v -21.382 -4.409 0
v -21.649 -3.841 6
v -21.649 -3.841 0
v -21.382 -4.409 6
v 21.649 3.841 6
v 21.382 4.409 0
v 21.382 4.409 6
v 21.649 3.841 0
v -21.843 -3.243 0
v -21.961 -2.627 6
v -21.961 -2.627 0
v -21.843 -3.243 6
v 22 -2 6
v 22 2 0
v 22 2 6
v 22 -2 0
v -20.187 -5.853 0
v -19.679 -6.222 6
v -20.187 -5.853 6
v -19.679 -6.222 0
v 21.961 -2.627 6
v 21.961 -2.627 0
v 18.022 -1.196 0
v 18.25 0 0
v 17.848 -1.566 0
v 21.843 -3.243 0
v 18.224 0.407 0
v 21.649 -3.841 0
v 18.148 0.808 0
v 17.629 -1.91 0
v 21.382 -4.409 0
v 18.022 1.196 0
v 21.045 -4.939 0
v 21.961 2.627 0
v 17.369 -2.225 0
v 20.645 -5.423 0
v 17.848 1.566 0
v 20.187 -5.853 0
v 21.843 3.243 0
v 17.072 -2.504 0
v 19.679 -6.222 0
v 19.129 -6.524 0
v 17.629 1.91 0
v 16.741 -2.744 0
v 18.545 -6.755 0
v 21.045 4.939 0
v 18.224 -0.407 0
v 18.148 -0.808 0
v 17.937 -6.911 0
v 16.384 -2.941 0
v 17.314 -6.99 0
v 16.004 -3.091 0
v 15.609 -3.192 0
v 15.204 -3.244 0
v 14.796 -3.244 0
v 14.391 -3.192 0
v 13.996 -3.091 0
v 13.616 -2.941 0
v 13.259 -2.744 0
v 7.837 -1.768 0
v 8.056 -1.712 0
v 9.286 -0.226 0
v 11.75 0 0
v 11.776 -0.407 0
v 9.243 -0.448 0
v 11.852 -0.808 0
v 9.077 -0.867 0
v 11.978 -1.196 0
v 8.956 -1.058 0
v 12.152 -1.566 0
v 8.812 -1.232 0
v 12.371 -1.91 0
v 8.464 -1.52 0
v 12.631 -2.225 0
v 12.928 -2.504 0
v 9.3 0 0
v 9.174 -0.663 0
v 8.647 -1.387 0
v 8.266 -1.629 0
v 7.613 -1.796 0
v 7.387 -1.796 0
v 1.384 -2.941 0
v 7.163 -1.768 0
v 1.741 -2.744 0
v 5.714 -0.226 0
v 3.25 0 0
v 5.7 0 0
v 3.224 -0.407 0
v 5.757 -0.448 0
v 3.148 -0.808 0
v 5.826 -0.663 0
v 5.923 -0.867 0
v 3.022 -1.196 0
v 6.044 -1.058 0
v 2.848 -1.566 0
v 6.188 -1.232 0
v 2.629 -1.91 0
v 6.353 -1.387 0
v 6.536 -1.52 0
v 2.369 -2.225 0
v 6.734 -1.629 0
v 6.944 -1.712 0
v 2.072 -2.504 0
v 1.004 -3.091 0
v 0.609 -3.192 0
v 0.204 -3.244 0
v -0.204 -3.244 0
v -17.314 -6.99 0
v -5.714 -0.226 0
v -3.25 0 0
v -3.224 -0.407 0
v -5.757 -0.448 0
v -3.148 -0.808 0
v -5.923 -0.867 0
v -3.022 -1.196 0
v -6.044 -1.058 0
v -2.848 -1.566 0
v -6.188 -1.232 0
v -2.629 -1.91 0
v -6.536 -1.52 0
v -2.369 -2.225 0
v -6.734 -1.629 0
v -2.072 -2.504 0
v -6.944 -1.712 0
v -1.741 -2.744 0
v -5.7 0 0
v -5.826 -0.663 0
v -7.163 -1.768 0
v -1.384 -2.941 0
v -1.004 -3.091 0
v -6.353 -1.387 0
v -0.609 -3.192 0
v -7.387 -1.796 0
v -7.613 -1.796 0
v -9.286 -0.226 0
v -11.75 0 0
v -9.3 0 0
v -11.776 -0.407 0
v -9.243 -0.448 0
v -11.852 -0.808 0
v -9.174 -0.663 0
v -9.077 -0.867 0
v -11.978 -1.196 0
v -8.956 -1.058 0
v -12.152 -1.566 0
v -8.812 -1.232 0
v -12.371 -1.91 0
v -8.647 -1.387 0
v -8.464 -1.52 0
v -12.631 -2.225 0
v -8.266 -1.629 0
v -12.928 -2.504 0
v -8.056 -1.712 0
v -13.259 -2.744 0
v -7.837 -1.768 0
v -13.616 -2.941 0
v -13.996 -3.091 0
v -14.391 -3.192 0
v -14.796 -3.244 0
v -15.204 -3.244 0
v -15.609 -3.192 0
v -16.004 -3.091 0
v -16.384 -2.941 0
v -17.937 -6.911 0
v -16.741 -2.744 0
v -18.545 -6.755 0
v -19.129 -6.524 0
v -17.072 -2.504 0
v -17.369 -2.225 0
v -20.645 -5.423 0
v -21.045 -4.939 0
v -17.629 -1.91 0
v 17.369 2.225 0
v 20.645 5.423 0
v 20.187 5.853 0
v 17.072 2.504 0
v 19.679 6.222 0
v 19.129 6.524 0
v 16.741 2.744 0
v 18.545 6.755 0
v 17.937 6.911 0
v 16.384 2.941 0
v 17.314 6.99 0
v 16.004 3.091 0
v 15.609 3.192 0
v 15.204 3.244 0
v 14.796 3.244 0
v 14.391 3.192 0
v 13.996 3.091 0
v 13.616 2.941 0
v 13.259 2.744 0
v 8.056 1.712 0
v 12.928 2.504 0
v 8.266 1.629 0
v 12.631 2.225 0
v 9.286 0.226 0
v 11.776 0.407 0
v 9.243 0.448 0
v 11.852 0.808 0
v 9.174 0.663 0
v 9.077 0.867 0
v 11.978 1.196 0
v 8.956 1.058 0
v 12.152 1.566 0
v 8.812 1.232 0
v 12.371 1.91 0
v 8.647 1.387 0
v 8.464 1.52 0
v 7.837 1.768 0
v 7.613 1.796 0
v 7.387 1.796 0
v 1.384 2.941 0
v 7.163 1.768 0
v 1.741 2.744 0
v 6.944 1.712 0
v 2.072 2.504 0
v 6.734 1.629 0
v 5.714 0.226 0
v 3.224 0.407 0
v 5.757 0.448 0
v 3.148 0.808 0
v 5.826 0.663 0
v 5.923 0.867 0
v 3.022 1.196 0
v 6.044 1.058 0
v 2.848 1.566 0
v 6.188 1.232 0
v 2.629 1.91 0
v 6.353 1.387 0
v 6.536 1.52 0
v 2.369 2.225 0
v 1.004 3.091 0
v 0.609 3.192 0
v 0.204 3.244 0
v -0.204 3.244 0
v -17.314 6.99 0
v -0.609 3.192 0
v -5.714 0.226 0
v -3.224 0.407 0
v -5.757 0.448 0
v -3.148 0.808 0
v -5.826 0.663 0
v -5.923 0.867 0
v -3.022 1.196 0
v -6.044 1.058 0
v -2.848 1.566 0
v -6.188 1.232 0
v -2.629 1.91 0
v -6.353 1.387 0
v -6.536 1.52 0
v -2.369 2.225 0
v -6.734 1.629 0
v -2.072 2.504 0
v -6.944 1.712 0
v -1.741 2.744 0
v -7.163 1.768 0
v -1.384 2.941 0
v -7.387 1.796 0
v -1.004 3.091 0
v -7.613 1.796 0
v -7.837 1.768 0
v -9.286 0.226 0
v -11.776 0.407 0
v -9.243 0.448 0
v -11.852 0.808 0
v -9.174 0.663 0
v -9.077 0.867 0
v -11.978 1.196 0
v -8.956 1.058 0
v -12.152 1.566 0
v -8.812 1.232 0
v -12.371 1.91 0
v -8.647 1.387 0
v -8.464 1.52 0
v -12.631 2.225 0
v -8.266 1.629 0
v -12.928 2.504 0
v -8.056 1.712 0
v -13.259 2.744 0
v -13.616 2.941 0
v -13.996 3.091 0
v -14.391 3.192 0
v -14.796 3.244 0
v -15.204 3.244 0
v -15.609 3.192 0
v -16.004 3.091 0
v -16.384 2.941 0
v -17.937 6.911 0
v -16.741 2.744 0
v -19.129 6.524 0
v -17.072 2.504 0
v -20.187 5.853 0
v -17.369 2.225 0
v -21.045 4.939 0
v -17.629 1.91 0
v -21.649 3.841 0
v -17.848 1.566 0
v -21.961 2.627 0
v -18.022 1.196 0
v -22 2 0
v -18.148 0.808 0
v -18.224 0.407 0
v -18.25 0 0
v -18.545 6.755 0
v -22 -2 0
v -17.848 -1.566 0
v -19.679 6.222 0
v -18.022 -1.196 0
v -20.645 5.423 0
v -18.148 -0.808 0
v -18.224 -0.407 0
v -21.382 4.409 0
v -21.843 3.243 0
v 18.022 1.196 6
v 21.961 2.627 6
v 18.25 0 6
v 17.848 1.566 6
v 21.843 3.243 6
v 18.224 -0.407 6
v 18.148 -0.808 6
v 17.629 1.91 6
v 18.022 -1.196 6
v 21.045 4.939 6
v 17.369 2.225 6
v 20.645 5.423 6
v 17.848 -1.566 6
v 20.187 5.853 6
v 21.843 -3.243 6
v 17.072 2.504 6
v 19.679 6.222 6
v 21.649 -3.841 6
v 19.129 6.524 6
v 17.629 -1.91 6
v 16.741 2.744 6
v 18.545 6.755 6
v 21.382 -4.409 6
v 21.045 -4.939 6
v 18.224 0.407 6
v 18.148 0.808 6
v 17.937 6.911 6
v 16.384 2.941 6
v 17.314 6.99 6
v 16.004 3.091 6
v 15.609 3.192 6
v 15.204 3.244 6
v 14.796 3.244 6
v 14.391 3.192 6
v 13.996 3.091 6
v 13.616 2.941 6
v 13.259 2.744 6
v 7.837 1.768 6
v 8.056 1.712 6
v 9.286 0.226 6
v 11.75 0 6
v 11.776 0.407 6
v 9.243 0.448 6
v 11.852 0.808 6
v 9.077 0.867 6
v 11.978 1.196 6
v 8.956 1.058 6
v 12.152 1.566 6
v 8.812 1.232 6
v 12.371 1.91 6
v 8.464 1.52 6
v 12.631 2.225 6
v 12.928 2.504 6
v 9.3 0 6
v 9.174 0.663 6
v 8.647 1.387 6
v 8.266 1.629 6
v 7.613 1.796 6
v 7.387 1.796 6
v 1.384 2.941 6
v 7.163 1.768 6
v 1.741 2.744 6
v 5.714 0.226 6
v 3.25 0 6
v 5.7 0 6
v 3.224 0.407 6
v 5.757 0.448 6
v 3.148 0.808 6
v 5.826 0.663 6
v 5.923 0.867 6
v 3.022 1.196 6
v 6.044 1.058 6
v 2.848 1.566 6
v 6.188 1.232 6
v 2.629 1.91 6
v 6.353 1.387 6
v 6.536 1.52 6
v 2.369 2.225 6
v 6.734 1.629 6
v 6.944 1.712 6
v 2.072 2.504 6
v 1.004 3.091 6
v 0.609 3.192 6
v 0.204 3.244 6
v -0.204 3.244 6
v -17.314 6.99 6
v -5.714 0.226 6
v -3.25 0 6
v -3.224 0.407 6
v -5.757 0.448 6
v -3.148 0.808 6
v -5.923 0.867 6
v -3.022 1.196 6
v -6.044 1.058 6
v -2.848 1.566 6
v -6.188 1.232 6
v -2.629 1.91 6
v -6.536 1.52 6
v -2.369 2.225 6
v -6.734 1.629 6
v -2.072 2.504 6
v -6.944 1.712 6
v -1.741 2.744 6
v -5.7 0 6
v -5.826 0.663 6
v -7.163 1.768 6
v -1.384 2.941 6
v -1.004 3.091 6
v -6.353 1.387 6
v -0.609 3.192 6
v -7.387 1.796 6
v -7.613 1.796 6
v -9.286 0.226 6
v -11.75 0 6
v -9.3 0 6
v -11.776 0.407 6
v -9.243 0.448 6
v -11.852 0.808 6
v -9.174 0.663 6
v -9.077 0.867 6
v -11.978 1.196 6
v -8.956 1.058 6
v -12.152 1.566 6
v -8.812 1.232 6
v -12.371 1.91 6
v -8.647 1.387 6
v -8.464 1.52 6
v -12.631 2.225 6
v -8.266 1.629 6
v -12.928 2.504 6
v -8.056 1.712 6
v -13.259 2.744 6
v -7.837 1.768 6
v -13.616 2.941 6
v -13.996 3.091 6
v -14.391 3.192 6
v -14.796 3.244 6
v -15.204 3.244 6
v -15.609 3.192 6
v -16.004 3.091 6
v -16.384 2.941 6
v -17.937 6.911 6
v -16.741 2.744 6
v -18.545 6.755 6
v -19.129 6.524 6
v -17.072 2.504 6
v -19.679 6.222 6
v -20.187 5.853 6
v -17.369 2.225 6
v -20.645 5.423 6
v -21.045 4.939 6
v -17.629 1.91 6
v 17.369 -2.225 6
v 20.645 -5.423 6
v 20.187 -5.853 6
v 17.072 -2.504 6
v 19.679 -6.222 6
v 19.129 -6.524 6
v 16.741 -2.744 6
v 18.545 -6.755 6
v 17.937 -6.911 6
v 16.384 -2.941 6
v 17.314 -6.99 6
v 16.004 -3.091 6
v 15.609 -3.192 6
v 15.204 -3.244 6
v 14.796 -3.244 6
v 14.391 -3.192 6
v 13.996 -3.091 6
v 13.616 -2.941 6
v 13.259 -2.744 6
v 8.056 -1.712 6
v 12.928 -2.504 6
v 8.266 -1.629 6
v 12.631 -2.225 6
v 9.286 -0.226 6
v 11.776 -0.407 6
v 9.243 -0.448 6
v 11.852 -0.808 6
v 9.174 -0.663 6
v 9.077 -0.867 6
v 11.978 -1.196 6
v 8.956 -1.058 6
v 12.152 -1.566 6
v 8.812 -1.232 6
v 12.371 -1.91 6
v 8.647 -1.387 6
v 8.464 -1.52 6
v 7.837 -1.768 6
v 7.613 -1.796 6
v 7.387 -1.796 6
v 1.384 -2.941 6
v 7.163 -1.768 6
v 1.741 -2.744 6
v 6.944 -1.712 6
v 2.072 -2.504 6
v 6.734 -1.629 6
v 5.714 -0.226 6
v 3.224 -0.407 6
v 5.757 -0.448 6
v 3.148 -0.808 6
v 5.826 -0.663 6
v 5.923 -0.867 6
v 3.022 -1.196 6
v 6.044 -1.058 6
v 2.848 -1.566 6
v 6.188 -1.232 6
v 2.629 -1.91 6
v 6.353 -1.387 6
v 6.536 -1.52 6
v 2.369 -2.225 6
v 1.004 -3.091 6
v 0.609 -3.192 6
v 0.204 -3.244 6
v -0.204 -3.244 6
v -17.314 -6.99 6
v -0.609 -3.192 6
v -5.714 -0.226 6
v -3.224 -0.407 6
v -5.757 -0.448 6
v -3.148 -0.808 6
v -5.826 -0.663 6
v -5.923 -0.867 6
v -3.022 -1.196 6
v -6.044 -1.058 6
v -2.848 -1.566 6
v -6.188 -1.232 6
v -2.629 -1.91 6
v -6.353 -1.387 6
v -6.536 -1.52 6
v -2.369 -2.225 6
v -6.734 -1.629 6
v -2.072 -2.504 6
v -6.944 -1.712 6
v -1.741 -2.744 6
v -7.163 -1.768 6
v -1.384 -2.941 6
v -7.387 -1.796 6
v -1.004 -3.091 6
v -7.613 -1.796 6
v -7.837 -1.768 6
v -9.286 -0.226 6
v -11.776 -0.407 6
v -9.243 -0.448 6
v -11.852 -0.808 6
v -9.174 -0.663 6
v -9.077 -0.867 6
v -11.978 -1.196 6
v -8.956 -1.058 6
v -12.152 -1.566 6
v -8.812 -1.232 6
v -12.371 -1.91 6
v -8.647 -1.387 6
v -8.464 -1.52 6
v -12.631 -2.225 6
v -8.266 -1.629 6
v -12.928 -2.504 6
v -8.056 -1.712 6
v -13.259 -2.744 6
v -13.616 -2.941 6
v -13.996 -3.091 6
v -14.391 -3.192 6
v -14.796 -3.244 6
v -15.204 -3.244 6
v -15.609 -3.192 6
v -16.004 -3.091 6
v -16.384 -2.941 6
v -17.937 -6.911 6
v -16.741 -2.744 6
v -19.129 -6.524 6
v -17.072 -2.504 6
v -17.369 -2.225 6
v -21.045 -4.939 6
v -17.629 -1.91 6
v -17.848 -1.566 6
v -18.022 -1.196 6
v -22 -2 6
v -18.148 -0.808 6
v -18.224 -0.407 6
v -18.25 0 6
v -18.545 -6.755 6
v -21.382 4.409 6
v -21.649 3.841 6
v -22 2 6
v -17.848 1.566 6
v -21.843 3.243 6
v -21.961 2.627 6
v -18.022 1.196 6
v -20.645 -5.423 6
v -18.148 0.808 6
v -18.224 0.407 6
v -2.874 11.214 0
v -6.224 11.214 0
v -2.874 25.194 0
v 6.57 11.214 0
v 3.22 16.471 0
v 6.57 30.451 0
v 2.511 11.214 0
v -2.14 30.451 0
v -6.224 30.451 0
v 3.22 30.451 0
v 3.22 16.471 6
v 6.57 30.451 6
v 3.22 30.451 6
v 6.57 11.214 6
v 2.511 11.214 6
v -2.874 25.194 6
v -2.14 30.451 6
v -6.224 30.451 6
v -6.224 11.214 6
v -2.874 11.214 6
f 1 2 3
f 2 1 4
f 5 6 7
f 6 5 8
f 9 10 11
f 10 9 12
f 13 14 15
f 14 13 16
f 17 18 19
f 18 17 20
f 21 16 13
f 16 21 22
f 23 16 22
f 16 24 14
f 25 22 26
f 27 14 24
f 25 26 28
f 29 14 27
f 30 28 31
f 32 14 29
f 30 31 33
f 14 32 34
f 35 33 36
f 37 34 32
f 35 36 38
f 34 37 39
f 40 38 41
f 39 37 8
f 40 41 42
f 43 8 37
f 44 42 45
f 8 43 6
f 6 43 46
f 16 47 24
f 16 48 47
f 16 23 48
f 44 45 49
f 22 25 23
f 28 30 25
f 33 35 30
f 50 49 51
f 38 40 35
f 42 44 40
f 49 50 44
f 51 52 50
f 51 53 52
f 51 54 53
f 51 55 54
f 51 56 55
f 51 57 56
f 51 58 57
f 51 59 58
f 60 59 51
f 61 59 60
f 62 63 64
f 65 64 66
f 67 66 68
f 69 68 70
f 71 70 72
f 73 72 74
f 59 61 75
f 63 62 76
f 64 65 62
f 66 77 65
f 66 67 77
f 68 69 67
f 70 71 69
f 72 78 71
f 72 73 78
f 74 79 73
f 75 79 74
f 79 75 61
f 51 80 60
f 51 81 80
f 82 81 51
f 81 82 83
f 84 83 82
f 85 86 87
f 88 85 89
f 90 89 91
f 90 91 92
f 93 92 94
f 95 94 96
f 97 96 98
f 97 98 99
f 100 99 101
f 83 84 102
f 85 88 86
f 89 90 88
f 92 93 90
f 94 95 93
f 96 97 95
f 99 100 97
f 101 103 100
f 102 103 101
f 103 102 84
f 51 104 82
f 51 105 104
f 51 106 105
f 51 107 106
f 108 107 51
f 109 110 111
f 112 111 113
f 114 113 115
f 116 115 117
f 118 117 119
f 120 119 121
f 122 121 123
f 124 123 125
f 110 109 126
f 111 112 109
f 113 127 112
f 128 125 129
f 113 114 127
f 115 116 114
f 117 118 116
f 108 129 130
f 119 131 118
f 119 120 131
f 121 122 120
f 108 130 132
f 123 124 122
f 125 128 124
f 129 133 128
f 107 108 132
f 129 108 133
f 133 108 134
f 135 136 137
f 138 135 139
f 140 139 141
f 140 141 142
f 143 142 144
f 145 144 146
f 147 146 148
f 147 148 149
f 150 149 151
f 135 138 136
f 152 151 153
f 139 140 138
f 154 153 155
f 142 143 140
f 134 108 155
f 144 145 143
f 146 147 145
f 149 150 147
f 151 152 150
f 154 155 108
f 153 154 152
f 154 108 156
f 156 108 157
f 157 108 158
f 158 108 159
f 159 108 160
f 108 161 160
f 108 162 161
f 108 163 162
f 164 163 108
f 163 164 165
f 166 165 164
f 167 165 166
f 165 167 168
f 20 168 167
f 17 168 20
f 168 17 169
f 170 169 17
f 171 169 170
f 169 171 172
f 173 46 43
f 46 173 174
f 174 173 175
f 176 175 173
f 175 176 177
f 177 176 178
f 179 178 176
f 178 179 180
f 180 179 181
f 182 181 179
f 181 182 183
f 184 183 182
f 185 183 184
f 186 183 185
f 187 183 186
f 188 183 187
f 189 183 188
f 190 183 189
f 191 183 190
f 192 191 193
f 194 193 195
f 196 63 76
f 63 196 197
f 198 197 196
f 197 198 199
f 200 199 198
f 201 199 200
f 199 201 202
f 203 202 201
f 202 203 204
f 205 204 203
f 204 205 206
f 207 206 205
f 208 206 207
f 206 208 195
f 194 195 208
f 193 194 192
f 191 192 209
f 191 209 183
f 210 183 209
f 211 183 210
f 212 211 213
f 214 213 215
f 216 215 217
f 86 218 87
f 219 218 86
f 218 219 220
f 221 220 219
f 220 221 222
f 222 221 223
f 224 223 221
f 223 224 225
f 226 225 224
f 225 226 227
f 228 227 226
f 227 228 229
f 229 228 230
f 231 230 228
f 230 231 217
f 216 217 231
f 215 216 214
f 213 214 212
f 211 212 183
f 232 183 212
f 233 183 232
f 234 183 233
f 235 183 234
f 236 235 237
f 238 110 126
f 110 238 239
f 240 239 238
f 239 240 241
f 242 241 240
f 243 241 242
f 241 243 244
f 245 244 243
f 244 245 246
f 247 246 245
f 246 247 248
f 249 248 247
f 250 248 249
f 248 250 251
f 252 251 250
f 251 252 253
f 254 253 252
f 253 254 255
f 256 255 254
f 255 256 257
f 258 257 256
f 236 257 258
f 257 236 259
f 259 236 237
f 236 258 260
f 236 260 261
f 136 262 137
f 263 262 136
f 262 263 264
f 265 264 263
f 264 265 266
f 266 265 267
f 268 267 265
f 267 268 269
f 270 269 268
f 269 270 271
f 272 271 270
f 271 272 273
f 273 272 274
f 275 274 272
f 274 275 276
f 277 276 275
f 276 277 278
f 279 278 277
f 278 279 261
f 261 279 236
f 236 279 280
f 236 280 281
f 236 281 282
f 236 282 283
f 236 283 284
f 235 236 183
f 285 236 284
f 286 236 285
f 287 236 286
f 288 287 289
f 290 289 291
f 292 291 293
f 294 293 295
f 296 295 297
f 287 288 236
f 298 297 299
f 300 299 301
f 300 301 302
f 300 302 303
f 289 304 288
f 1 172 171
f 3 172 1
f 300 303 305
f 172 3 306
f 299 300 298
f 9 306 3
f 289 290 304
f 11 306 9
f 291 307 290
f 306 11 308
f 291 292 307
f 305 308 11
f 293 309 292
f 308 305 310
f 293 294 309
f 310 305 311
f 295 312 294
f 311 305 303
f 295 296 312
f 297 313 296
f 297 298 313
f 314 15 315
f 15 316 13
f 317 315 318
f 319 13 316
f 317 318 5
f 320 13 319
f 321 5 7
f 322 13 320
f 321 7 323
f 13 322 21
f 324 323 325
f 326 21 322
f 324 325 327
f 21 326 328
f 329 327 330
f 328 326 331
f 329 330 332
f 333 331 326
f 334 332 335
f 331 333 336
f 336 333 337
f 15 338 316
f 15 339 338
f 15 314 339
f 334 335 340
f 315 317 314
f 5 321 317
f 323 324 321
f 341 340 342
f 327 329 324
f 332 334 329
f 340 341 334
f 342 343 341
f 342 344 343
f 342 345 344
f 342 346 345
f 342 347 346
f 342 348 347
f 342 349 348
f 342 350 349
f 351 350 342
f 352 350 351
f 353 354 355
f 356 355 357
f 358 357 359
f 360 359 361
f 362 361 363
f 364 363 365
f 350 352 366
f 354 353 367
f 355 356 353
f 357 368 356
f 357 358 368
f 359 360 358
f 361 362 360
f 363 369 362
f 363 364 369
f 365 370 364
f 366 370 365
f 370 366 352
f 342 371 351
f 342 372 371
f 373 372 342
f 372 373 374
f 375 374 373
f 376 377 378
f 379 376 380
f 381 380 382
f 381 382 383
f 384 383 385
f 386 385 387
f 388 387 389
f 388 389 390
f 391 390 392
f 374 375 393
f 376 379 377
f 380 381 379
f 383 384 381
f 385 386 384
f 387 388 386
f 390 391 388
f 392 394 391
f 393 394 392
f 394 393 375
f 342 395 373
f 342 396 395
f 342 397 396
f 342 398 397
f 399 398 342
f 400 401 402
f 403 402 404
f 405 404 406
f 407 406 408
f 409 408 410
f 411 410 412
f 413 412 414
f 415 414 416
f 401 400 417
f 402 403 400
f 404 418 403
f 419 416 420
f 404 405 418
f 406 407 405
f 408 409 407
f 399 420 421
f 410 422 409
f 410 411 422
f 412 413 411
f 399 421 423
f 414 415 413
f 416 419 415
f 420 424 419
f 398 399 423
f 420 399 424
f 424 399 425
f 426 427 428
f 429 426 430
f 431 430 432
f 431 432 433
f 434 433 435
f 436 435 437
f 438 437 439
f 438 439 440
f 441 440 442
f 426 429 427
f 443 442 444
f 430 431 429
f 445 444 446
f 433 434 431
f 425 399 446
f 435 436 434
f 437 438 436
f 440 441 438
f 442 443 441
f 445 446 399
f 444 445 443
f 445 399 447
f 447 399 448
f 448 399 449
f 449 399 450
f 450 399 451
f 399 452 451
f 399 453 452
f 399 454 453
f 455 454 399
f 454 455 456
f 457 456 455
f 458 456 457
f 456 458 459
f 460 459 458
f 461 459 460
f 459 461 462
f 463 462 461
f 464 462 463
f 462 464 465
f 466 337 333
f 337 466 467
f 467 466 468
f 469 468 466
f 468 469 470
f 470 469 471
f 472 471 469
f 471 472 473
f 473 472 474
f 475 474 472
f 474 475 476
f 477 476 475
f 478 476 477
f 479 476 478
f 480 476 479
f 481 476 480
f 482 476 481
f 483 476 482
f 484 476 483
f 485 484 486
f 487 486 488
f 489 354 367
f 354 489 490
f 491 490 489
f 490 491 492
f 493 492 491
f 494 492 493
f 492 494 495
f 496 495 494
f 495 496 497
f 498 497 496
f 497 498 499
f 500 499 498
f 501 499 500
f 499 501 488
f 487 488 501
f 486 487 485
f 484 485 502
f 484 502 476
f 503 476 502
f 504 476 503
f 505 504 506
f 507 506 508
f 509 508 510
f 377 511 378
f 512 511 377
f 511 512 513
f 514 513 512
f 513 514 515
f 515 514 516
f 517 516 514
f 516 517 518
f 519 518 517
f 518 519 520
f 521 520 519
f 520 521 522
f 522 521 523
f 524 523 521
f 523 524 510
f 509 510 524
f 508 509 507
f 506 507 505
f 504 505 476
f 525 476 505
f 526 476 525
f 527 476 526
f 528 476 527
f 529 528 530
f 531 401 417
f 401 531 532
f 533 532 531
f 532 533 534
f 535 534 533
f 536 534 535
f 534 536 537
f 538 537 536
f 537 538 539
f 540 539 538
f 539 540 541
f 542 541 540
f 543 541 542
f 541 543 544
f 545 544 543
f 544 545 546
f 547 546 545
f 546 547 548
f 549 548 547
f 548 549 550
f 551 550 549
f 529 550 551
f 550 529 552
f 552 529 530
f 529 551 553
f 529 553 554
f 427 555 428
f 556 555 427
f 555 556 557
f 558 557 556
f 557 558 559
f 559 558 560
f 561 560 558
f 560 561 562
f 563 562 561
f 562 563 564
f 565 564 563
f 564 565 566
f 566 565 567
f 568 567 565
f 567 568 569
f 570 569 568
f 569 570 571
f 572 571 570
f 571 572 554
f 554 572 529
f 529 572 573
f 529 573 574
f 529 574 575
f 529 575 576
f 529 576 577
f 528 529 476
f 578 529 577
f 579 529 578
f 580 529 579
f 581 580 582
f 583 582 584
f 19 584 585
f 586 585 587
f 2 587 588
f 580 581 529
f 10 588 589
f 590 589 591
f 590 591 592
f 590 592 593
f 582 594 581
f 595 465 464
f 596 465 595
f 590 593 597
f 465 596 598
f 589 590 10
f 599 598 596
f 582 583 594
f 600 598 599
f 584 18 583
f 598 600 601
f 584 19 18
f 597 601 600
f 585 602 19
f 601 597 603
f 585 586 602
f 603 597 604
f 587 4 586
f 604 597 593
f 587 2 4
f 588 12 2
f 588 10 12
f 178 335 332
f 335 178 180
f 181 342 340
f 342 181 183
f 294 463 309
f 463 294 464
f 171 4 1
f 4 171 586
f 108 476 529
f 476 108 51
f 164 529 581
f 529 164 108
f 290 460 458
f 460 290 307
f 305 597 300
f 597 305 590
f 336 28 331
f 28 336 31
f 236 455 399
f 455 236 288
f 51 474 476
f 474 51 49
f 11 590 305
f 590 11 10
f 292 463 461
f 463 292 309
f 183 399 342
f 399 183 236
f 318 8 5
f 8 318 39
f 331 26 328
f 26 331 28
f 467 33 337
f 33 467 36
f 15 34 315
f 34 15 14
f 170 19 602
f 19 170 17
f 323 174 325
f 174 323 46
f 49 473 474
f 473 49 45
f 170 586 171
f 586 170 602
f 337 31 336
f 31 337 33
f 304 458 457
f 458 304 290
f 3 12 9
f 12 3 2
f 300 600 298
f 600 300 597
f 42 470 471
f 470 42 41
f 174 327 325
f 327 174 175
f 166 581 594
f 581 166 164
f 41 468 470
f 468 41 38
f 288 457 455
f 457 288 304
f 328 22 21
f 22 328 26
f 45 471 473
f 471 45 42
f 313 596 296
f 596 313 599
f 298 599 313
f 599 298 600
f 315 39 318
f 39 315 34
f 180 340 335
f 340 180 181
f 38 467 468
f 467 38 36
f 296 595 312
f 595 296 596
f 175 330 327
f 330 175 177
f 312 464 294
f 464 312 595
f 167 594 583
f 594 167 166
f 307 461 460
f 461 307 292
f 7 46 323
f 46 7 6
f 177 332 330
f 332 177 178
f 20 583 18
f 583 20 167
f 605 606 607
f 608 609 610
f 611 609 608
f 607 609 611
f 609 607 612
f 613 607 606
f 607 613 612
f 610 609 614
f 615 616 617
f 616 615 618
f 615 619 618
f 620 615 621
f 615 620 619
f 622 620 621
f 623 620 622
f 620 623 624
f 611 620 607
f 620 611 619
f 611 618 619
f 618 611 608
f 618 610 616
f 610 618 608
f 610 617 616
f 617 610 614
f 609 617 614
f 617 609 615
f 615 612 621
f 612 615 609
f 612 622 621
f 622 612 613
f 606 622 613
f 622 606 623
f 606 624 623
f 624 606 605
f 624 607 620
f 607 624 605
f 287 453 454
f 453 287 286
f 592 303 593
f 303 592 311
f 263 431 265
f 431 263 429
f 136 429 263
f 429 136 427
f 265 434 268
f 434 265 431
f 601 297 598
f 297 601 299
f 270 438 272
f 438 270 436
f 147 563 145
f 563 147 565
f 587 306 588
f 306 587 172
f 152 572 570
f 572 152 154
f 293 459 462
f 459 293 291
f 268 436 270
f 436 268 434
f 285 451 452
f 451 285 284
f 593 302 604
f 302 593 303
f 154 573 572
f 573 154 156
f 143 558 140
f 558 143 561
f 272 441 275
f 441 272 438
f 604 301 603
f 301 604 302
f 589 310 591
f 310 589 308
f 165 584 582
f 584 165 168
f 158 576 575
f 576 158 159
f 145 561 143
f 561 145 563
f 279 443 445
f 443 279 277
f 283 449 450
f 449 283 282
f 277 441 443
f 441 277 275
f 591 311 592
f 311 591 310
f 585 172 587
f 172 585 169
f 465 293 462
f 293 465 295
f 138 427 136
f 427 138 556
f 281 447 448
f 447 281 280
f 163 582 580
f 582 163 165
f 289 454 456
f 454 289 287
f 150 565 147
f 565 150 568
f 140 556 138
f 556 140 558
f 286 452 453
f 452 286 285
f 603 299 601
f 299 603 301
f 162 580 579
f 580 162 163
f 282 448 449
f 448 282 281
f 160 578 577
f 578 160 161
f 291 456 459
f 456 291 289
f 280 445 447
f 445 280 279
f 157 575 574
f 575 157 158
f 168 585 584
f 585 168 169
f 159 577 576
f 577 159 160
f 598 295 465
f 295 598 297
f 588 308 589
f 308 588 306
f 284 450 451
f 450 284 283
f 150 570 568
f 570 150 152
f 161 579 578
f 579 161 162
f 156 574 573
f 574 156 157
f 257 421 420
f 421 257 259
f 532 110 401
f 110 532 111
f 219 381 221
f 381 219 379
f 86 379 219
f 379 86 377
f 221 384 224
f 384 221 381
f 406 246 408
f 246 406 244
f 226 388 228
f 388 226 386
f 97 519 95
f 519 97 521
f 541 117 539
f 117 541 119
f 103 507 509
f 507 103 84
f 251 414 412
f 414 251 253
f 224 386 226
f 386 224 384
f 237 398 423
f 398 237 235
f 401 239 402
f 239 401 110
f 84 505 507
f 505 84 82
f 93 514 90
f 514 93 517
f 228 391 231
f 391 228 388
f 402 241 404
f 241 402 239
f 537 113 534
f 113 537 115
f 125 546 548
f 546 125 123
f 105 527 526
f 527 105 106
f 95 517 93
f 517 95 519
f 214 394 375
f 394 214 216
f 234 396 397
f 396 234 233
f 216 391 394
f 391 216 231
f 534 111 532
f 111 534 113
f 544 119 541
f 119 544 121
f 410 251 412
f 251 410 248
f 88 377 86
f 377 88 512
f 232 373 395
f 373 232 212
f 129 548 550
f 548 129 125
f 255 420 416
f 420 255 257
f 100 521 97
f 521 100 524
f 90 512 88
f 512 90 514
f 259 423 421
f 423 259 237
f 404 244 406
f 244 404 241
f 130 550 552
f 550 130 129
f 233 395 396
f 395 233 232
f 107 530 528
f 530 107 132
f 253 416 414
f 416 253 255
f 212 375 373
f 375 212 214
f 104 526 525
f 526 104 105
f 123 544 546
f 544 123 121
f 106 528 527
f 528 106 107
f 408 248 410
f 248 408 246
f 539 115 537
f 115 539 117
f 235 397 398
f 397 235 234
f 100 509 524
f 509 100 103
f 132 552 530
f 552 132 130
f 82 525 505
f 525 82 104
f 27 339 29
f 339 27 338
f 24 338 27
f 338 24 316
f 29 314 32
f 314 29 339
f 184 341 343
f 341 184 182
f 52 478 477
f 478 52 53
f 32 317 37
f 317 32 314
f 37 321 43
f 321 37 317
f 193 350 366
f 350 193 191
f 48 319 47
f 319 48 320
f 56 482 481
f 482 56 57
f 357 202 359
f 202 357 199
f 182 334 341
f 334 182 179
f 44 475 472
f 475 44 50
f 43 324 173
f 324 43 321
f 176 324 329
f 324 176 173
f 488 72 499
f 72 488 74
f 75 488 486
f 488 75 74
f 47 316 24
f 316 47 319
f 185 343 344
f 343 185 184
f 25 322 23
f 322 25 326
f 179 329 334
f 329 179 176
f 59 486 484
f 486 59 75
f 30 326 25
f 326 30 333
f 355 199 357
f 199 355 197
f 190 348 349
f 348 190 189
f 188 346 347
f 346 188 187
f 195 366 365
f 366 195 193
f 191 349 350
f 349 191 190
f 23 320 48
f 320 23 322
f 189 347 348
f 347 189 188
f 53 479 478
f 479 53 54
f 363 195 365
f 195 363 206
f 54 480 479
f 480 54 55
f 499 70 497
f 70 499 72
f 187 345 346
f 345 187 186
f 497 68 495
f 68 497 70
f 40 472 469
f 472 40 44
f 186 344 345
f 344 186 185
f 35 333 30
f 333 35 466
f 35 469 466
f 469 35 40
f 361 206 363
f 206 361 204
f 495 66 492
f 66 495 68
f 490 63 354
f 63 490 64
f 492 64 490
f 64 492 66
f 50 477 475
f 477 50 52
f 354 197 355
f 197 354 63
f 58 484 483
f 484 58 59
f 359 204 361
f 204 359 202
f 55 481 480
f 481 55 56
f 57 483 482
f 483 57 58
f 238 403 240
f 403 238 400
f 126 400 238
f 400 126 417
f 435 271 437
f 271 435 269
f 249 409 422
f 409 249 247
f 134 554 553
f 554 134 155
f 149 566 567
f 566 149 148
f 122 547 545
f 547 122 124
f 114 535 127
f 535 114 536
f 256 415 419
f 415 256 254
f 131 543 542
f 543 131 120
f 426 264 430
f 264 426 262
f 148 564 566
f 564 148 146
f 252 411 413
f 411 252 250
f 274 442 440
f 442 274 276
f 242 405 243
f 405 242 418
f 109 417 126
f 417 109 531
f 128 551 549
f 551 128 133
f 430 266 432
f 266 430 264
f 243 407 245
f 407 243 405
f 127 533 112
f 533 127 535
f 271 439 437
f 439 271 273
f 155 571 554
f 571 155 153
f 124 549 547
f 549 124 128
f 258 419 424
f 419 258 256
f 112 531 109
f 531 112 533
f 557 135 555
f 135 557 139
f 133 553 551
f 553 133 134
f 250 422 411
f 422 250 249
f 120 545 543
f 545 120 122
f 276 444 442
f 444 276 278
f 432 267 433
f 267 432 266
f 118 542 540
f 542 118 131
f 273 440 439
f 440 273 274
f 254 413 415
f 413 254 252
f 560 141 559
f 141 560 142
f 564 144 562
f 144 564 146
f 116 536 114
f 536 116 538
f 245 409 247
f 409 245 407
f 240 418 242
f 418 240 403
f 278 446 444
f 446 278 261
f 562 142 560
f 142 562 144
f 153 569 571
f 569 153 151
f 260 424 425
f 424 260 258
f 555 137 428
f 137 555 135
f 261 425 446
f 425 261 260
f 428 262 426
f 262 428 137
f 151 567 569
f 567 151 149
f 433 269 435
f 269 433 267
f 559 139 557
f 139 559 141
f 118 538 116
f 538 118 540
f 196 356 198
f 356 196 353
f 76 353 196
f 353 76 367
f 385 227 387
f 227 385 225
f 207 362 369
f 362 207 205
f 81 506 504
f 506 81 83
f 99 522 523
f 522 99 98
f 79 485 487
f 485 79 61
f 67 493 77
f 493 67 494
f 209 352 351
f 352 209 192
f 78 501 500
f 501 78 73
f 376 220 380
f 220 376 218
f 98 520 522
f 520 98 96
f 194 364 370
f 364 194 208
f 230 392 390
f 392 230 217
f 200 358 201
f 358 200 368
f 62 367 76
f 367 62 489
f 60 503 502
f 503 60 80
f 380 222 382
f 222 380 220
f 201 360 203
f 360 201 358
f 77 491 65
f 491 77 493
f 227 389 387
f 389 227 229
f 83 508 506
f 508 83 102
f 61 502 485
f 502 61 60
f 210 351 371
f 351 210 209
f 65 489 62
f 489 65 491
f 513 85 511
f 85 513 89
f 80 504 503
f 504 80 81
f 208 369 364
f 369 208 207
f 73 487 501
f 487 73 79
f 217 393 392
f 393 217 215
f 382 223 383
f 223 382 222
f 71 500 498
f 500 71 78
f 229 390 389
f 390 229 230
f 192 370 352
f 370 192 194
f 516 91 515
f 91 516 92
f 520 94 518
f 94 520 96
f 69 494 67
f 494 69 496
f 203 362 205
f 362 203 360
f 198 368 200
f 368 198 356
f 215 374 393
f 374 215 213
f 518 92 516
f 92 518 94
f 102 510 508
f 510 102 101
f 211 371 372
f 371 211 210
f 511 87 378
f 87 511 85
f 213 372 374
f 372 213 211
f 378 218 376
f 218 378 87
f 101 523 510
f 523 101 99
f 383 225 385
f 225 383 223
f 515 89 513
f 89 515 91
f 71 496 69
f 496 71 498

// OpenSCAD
$fn = 50;


difference() {
	union() {
		hull() {
			translate(v = [-17.0000000000, 2.0000000000, 0]) {
				cylinder(h = 6, r = 5);
			}
			translate(v = [17.0000000000, 2.0000000000, 0]) {
				cylinder(h = 6, r = 5);
			}
			translate(v = [-17.0000000000, -2.0000000000, 0]) {
				cylinder(h = 6, r = 5);
			}
			translate(v = [17.0000000000, -2.0000000000, 0]) {
				cylinder(h = 6, r = 5);
			}
		}
		translate(v = [0, 30.0000000000, 0]) {
			linear_extrude(height = 6) {
				text(font = "DejaVu Sans Mono:style=Bold", halign = "center", size = 19.0000000000, text = "N", valign = "top");
			}
		}
	}
	union() {
		translate(v = [-15.0000000000, 0.0000000000, 0]) {
			translate(v = [0, 0, -100]) {
				cylinder(h = 200, r = 3.2500000000);
			}
		}
		translate(v = [0, 0, -100]) {
			cylinder(h = 200, r = 3.2500000000);
		}
		translate(v = [15.0000000000, 0.0000000000, 0]) {
			translate(v = [0, 0, -100]) {
				cylinder(h = 200, r = 3.2500000000);
			}
		}
		translate(v = [-15.0000000000, 0.0000000000, 0]) {
			translate(v = [0, 0, -100]) {
				cylinder(h = 200, r = 1.8000000000);
			}
		}
		translate(v = [-7.5000000000, 0.0000000000, 0]) {
			translate(v = [0, 0, -100]) {
				cylinder(h = 200, r = 1.8000000000);
			}
		}
		translate(v = [0, 0, -100]) {
			cylinder(h = 200, r = 1.8000000000);
		}
		translate(v = [7.5000000000, 0.0000000000, 0]) {
			translate(v = [0, 0, -100]) {
				cylinder(h = 200, r = 1.8000000000);
			}
		}
		translate(v = [15.0000000000, 0.0000000000, 0]) {
			translate(v = [0, 0, -100]) {
				cylinder(h = 200, r = 1.8000000000);
			}
		}
	}
}
